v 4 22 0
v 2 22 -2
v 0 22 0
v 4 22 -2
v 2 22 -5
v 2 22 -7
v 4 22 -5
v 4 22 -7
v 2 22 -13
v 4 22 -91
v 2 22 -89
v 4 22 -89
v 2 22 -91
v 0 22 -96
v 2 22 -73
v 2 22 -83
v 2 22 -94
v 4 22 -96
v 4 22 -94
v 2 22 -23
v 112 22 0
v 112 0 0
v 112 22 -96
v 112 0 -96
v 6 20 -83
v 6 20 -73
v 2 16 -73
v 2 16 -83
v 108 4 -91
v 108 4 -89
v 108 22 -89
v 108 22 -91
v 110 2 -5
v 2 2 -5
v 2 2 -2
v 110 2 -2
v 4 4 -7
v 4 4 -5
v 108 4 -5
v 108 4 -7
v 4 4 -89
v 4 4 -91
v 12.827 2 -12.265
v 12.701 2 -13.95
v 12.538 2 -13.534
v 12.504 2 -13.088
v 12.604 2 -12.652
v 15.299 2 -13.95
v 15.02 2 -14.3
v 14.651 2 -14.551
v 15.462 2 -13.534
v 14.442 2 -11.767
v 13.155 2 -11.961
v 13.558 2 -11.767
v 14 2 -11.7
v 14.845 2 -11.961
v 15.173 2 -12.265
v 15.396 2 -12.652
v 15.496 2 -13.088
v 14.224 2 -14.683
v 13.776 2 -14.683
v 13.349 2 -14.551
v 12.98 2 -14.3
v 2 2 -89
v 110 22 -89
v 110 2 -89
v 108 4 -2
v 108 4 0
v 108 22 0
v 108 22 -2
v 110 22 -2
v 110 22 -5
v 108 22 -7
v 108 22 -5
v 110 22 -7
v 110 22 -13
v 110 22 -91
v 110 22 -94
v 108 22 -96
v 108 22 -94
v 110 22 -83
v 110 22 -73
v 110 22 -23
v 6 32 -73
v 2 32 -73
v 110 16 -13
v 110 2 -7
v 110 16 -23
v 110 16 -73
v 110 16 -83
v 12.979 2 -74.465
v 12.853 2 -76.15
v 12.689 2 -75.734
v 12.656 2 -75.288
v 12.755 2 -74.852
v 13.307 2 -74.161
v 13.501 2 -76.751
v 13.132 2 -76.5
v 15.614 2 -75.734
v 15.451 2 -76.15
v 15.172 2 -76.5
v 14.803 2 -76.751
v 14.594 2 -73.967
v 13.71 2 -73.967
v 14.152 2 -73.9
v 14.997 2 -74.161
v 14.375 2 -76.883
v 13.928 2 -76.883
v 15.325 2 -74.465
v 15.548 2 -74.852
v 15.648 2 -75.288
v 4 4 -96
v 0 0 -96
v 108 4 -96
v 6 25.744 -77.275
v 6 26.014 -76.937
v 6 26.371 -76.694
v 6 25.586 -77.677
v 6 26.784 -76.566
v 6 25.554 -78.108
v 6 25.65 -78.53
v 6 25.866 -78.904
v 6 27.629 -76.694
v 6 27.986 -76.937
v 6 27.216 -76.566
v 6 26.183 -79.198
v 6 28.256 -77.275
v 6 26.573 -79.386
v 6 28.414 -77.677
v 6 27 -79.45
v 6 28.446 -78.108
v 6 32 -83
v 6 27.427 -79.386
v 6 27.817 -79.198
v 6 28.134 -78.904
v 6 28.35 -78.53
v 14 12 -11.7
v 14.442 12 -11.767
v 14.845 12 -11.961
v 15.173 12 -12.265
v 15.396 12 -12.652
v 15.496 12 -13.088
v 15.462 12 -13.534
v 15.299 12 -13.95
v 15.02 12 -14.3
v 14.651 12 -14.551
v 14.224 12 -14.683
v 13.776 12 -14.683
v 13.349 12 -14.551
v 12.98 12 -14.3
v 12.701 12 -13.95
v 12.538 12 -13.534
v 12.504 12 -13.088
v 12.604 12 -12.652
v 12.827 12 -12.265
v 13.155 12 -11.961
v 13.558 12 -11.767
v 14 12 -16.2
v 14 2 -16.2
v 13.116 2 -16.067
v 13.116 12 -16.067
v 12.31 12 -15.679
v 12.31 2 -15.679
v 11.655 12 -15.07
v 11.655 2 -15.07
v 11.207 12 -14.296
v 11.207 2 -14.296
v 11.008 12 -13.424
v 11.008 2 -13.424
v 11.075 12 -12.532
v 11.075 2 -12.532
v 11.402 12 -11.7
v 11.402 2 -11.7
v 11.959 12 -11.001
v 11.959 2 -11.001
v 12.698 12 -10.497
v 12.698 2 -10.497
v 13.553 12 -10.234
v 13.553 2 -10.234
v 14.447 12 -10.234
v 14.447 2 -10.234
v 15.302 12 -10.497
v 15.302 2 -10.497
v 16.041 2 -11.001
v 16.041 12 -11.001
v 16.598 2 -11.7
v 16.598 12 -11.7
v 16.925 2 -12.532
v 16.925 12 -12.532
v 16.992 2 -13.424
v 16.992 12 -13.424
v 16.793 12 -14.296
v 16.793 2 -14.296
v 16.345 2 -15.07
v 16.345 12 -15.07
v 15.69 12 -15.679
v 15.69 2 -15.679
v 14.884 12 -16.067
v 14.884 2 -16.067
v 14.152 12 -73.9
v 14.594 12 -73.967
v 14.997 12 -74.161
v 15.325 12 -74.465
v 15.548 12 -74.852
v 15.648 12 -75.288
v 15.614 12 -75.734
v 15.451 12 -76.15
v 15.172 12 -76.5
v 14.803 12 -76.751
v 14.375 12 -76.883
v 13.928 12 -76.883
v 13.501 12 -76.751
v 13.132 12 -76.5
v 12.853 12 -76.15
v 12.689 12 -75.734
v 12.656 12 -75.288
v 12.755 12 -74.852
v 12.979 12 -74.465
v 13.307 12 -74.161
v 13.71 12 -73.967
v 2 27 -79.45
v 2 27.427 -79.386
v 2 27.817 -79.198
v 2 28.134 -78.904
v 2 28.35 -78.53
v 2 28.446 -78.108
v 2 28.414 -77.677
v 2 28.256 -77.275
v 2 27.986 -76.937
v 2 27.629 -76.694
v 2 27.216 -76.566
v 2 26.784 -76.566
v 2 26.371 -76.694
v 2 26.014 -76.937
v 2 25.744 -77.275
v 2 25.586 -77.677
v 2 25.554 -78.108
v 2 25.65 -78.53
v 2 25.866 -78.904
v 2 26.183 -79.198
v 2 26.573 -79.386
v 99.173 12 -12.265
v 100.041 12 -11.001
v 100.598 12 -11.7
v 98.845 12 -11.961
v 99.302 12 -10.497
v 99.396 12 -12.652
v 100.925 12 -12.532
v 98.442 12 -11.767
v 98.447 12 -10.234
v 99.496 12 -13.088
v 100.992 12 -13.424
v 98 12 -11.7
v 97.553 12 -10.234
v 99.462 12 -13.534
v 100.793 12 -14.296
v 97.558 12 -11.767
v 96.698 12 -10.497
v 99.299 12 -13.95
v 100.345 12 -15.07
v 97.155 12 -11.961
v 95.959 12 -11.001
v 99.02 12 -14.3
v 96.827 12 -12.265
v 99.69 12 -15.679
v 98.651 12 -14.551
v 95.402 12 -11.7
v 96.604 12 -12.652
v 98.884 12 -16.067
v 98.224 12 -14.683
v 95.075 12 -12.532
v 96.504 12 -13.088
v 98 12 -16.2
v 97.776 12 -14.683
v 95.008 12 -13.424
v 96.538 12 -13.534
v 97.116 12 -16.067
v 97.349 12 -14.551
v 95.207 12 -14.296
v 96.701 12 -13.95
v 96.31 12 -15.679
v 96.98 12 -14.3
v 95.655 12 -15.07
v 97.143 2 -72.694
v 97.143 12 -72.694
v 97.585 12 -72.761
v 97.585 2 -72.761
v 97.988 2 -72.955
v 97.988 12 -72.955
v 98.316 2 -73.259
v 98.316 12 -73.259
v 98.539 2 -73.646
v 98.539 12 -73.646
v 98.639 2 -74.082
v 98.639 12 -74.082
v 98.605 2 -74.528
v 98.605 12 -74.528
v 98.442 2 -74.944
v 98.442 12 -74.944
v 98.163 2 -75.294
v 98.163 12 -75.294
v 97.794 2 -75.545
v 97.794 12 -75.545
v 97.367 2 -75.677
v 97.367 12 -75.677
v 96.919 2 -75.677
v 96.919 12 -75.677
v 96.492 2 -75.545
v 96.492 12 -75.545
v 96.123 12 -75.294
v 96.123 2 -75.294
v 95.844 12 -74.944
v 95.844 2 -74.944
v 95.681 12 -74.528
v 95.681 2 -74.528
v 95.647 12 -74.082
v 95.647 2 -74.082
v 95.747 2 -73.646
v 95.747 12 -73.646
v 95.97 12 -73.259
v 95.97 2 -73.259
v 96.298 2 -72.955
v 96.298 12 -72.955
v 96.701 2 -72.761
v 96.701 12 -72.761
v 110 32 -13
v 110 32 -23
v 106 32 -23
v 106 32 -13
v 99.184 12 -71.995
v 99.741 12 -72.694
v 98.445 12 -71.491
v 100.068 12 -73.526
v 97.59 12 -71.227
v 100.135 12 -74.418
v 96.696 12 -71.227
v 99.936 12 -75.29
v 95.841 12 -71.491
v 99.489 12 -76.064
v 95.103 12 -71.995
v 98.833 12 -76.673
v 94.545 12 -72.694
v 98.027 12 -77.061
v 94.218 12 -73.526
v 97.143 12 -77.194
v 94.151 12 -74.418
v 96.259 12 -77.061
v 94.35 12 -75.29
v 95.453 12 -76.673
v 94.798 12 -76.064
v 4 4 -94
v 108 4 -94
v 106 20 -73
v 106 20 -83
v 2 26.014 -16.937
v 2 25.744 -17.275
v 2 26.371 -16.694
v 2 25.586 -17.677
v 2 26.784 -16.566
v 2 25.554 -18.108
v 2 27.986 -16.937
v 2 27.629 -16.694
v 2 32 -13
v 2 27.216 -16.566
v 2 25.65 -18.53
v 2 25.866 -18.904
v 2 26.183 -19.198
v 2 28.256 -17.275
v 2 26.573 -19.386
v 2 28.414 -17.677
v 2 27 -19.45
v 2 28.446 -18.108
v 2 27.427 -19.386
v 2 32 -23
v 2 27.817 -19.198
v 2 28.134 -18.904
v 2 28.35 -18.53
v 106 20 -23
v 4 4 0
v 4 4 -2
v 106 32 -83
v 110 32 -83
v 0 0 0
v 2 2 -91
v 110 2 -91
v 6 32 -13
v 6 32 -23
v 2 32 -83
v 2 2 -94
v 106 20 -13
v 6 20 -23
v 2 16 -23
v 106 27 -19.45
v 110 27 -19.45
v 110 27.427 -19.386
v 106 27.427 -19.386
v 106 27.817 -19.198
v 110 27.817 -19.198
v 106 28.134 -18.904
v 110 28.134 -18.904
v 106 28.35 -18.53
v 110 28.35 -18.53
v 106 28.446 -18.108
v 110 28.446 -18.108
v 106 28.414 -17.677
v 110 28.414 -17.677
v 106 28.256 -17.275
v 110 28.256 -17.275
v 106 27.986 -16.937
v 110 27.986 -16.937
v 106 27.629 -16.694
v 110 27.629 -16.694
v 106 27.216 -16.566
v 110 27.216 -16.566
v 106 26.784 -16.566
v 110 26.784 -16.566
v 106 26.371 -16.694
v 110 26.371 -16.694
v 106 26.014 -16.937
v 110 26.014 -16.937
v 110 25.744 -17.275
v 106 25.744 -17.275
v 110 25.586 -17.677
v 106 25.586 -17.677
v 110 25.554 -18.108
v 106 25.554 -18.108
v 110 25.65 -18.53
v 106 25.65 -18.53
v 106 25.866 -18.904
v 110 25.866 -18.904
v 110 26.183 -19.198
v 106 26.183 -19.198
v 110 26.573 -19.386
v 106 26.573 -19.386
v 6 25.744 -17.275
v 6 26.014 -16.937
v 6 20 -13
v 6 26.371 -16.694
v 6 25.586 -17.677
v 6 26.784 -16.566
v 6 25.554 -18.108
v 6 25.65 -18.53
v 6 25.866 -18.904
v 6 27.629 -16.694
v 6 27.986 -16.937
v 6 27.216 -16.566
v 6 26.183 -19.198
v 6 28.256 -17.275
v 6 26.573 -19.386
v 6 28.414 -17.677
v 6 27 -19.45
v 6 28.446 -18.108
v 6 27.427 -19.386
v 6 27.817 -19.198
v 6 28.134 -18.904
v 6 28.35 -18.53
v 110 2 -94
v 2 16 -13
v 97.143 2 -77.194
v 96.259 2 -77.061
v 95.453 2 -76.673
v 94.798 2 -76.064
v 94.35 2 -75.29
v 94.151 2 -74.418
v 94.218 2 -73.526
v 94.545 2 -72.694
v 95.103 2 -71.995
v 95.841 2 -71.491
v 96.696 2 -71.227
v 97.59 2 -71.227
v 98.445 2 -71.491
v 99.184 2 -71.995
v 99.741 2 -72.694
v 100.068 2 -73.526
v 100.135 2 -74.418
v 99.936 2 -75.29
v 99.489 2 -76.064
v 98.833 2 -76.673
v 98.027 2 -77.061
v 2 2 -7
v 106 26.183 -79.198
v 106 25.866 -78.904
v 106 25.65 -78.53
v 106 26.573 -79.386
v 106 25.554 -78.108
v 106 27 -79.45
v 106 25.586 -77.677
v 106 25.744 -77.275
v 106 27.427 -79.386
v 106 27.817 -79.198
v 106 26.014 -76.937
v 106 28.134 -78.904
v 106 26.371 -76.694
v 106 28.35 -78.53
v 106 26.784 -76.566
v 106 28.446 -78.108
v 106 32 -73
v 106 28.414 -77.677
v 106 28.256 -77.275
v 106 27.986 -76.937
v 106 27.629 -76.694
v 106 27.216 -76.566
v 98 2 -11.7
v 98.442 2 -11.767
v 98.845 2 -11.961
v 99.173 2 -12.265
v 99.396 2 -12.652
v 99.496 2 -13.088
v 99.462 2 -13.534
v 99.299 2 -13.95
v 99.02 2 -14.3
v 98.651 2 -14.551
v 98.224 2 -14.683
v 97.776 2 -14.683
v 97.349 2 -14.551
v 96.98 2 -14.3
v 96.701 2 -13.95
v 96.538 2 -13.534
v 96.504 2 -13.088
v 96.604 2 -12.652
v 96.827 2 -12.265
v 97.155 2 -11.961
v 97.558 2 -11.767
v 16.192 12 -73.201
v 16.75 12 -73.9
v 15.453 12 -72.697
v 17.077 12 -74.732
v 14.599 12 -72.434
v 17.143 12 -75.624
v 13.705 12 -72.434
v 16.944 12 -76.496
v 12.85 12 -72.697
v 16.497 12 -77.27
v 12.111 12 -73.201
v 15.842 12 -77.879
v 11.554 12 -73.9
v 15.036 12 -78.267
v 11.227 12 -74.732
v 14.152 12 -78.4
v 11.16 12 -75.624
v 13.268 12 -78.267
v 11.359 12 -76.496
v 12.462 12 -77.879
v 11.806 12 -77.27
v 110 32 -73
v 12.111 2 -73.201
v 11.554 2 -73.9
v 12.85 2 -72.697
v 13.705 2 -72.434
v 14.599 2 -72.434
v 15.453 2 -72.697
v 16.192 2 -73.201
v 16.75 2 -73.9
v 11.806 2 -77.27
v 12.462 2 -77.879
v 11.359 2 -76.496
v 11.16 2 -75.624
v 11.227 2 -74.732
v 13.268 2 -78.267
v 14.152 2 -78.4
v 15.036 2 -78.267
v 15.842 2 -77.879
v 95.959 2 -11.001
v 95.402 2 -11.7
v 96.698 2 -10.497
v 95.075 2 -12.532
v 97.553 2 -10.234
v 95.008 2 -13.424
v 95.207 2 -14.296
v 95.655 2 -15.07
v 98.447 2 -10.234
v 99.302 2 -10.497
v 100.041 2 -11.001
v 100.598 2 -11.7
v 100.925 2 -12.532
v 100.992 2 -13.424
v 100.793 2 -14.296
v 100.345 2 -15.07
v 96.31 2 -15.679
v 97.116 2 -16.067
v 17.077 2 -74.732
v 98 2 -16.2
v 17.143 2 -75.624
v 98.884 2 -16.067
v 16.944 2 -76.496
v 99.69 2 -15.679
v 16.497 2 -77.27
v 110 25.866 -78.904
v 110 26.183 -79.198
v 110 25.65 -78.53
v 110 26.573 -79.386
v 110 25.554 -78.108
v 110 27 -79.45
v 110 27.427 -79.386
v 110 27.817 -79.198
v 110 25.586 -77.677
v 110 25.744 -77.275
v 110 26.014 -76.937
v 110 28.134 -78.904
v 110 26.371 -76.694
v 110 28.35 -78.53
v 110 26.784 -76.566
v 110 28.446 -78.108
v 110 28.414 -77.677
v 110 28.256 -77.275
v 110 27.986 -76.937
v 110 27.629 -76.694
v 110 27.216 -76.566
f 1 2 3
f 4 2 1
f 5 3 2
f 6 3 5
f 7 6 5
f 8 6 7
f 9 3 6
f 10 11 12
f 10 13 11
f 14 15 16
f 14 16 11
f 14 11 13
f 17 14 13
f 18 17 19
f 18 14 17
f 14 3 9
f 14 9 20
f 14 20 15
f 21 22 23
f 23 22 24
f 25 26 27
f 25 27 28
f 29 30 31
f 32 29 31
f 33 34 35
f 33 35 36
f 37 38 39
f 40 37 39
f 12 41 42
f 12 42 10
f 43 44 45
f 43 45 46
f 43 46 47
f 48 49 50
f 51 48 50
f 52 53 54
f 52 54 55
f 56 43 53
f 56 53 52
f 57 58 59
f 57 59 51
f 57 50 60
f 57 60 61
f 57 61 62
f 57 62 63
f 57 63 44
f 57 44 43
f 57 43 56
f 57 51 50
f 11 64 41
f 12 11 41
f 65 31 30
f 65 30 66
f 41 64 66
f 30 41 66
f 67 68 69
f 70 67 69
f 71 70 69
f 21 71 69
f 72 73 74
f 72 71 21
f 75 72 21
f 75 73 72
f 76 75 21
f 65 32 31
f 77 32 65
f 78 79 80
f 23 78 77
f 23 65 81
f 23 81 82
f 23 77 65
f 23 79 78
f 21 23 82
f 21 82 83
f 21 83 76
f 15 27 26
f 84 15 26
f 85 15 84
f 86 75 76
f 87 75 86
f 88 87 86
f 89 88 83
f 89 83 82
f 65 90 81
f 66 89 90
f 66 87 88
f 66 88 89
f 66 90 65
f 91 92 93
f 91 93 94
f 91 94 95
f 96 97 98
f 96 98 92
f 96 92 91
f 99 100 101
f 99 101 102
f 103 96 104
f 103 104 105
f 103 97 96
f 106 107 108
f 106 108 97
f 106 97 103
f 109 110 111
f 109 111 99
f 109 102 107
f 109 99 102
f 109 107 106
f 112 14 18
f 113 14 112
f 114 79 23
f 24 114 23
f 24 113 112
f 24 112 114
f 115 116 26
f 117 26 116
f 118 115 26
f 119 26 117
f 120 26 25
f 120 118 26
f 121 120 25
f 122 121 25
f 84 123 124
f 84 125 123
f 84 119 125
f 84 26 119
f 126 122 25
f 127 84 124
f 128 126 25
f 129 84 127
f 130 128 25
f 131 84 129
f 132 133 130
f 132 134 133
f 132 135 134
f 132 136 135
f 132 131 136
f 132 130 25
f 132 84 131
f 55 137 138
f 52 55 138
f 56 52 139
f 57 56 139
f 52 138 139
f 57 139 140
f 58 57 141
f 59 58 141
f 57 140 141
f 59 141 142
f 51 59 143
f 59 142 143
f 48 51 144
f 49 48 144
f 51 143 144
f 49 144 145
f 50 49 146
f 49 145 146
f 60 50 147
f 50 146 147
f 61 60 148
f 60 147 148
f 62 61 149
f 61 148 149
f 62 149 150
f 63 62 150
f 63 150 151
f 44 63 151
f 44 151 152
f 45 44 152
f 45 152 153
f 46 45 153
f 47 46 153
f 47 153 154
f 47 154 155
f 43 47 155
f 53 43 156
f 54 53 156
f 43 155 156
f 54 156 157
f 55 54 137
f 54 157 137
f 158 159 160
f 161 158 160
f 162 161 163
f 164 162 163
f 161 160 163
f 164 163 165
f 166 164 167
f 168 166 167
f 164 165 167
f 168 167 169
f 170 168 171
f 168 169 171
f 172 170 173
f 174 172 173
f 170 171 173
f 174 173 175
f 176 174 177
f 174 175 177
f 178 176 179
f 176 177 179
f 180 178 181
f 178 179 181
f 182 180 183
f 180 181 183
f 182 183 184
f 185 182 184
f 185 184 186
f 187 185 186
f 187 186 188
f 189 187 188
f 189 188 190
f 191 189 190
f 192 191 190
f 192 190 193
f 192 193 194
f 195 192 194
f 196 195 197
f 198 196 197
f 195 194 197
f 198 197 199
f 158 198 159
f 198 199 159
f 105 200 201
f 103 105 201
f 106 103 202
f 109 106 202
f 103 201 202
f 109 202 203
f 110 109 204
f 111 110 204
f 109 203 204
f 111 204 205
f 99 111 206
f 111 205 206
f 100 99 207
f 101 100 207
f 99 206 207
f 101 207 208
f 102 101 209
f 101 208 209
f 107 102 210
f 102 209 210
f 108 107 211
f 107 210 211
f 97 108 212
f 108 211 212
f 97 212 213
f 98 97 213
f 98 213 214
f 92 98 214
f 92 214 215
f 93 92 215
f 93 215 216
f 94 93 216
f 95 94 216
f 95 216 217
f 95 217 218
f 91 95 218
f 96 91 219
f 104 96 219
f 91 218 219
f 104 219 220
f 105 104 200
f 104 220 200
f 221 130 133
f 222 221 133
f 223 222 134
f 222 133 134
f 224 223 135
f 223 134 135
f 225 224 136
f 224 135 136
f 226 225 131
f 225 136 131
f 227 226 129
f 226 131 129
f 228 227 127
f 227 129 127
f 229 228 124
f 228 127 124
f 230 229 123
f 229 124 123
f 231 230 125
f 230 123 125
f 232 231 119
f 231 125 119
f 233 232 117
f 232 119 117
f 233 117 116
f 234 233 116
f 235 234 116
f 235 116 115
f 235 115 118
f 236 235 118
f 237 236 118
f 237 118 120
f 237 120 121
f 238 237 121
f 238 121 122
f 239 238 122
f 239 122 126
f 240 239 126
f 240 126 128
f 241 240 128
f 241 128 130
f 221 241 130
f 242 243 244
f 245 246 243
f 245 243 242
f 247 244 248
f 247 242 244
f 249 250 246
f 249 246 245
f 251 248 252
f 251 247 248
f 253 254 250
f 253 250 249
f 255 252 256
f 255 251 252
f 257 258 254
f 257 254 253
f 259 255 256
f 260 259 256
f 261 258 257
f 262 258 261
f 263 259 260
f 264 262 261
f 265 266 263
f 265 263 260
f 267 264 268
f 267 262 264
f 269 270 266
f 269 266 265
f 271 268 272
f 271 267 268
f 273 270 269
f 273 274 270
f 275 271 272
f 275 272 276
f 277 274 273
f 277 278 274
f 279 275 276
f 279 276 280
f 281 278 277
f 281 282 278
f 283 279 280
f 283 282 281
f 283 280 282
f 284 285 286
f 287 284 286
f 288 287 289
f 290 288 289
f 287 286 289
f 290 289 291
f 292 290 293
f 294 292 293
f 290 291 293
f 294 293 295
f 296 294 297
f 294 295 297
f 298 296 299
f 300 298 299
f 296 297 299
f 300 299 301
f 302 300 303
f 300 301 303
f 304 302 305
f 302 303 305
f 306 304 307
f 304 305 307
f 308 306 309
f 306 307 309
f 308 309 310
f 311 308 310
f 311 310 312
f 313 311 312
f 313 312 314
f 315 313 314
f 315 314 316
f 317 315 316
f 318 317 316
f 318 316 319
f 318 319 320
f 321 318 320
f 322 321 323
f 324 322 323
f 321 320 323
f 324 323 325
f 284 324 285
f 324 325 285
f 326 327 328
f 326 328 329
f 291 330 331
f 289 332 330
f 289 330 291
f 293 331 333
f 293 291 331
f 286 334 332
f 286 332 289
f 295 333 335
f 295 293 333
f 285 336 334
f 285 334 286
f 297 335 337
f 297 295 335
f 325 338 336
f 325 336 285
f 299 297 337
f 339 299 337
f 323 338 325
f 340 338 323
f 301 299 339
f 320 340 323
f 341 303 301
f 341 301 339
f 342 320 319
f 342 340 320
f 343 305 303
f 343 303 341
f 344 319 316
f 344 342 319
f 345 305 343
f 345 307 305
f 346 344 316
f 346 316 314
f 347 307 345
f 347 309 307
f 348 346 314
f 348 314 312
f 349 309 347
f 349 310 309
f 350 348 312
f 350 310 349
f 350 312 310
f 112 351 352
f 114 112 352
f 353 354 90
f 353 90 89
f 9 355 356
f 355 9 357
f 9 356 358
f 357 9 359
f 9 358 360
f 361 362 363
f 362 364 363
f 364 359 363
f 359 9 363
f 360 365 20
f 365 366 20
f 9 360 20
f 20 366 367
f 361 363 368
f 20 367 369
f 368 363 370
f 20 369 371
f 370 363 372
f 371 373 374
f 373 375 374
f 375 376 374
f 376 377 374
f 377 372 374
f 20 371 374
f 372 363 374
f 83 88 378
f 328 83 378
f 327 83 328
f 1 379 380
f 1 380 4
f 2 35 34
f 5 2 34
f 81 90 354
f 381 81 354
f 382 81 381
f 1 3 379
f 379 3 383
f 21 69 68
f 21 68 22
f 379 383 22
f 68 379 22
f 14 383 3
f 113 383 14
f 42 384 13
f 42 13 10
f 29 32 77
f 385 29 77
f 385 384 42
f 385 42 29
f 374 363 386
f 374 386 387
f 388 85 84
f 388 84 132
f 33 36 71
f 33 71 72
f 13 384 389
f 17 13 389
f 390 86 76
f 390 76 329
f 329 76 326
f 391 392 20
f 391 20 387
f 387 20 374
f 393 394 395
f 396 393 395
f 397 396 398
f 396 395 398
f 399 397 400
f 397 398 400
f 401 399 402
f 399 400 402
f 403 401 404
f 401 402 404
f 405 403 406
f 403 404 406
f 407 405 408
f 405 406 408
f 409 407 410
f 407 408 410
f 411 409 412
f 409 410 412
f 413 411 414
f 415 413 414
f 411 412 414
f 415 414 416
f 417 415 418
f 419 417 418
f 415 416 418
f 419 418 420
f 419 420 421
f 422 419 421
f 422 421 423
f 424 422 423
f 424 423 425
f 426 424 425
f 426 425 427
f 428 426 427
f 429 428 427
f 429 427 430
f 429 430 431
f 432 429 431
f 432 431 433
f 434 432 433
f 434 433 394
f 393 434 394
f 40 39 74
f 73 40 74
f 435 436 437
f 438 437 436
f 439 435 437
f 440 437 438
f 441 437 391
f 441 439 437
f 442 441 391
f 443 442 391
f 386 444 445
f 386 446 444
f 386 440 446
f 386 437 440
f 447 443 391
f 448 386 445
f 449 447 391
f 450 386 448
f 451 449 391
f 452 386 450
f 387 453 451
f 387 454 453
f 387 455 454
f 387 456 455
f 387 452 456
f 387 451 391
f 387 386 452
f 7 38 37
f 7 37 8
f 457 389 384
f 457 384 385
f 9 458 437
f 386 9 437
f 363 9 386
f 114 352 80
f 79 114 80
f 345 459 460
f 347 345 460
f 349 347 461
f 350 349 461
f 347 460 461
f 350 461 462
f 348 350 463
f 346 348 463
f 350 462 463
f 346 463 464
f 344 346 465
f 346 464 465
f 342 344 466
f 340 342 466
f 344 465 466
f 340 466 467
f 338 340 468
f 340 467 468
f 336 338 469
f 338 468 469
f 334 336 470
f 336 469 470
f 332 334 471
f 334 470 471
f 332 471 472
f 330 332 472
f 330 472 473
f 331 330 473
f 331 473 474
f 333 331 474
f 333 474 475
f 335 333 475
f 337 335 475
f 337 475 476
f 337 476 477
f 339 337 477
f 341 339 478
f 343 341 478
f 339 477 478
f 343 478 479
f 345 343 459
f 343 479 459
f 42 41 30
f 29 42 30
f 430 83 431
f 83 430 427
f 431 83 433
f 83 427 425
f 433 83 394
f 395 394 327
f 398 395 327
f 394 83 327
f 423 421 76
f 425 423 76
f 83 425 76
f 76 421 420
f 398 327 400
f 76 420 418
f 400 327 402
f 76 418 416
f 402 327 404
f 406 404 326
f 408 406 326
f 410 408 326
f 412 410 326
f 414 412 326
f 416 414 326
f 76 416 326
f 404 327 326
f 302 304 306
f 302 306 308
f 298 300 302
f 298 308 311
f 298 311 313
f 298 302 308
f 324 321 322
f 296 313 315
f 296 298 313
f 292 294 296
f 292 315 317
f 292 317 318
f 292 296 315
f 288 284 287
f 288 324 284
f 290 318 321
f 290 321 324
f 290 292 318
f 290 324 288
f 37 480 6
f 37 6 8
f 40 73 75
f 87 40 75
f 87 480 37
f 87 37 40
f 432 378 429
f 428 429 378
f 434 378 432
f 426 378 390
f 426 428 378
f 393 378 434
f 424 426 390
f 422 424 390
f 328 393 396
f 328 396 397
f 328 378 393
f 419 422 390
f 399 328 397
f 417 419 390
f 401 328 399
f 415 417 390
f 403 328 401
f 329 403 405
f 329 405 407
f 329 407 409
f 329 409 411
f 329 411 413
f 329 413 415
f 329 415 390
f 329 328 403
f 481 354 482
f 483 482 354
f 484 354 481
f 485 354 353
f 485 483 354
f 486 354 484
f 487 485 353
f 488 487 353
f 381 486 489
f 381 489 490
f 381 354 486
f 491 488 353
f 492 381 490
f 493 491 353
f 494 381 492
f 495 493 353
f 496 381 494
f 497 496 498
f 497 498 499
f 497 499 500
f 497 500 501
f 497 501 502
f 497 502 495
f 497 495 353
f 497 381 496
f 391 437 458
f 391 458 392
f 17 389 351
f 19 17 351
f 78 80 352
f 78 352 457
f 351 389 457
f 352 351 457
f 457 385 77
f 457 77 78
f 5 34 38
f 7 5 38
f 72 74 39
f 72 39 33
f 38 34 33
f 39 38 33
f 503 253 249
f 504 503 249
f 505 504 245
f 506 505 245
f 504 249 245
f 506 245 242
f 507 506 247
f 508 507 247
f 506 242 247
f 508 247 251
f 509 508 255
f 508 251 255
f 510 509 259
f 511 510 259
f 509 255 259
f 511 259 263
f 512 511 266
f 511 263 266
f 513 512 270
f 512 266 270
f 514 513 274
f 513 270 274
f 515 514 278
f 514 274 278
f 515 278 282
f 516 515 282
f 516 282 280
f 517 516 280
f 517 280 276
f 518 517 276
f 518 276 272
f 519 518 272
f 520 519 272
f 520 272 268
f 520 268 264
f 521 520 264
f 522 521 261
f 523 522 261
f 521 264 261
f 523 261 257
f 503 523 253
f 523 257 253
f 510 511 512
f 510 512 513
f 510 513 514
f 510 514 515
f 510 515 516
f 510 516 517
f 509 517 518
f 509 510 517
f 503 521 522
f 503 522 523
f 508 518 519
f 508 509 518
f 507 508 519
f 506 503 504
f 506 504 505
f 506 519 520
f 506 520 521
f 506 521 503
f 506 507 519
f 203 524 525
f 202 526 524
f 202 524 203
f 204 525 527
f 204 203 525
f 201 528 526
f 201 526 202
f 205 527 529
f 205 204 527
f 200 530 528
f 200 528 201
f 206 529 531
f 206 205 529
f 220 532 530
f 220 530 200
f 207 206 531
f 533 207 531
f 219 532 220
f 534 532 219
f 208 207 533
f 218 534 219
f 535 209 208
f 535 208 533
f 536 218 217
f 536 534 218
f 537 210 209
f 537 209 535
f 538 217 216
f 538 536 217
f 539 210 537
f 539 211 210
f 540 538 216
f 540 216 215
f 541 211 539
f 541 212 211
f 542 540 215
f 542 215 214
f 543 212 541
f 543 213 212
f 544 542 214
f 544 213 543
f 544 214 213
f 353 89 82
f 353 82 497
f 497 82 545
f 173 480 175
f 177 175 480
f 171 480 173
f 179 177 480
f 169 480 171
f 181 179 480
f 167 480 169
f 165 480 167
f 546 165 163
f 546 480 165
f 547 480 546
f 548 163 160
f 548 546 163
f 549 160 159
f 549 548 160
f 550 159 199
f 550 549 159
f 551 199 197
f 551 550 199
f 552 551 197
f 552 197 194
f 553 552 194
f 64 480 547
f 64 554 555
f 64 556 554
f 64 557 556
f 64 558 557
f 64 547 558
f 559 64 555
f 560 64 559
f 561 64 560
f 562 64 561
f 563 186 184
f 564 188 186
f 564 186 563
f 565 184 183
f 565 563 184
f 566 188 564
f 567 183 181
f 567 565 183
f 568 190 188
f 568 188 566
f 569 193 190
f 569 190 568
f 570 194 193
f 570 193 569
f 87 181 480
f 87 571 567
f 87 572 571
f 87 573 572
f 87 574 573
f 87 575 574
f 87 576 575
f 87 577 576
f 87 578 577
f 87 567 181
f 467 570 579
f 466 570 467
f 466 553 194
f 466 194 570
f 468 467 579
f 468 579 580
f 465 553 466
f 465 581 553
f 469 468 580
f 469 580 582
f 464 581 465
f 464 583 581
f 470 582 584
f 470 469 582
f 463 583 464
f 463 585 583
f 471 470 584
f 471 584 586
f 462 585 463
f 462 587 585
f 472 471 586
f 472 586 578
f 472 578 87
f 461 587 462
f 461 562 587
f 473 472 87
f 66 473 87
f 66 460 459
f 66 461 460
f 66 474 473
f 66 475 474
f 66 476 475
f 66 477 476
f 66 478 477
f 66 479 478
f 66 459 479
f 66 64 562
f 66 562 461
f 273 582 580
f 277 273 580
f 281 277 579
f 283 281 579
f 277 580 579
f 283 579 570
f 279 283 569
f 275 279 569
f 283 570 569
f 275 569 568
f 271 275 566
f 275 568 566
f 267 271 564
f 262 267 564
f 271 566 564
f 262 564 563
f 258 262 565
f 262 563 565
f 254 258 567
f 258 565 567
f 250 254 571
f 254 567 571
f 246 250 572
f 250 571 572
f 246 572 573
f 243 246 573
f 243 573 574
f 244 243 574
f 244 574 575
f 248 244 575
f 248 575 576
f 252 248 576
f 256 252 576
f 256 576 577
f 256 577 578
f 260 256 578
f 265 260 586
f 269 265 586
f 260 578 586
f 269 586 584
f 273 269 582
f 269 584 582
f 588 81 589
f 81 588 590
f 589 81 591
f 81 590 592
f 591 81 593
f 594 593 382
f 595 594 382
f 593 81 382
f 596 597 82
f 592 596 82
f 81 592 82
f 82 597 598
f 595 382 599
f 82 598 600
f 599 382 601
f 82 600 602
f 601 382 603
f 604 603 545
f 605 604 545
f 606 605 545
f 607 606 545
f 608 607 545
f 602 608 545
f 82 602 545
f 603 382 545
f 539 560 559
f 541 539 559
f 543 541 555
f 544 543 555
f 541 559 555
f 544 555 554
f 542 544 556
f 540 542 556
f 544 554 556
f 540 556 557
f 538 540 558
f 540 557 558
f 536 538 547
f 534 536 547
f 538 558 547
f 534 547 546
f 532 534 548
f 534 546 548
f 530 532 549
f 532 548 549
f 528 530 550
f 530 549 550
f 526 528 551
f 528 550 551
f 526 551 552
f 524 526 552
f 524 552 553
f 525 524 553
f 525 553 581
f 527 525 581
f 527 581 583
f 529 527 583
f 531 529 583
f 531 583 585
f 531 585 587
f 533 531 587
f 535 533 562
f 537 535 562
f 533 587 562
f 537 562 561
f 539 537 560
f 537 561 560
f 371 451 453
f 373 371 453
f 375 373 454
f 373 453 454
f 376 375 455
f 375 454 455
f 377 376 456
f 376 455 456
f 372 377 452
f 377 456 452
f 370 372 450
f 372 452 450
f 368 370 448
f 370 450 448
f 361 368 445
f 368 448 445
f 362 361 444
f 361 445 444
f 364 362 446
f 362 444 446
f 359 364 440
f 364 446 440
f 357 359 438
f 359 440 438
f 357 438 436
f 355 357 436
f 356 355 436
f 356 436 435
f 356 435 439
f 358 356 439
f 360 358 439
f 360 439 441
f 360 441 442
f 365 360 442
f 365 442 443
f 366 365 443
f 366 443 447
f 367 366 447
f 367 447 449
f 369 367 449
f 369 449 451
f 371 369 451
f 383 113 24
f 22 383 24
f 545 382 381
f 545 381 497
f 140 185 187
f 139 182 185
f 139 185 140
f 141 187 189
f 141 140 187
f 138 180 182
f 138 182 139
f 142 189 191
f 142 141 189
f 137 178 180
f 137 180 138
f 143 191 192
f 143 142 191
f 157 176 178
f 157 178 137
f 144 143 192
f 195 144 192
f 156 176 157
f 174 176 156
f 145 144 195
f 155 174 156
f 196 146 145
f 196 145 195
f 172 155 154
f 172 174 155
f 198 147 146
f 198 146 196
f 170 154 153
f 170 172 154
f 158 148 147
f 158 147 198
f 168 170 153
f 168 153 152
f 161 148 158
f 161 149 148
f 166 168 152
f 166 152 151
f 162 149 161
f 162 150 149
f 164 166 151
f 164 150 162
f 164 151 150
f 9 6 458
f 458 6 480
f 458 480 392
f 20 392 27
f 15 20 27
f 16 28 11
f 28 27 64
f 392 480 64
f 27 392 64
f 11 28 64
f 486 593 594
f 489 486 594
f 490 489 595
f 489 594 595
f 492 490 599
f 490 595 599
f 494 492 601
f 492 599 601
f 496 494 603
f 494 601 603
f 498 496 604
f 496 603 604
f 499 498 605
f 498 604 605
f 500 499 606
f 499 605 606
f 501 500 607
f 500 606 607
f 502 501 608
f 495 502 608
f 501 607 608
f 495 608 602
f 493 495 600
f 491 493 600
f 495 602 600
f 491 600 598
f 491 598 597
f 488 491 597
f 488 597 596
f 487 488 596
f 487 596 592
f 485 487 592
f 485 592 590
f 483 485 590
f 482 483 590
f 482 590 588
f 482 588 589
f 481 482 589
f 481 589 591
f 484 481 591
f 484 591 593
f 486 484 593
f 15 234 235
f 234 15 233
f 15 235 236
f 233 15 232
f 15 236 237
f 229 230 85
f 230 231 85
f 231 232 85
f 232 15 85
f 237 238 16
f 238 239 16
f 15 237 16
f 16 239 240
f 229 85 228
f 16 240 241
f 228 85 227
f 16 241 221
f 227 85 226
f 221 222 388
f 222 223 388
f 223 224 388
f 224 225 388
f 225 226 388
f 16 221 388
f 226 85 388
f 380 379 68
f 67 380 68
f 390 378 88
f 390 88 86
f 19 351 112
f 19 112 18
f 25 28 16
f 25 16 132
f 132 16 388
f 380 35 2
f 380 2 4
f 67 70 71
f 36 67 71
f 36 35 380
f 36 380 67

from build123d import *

# Parameters (mm, degrees)
ESBO_O1_W                = 112
ESBO_O1_H                = 96
RESSALTO_EXTRUS_O1_DEPTH = 2
ESBO_O2_W                = 2
ESBO_O2_H                = 96
RESSALTO_EXTRUS_O2_DEPTH = 20
ESBO_O3_W                = 108
ESBO_O3_H                = 2
RESSALTO_EXTRUS_O3_DEPTH = 20
ESBO_O5_W                = 104
ESBO_O5_H                = 18
CORTE_EXTRUS_O1_DEPTH    = 150.1442255
ESBO_O6_R                = 3
RESSALTO_EXTRUS_O4_DEPTH = 10
ESBO_O7_R                = 1.5
CORTE_EXTRUS_O2_DEPTH    = 10
ESBO_O8_W                = 10
ESBO_O8_H                = 16
RESSALTO_EXTRUS_O5_DEPTH = 4
ESBO_O9_W                = 10
ESBO_O9_H                = 16
RESSALTO_EXTRUS_O6_DEPTH = 4
ESBO_O10_R               = 1.45
CORTE_EXTRUS_O3_DEPTH    = 150.465715132
CHANFRO2_SIZE            = 4


with BuildPart() as part:
    # Esboço1 → Ressalto-extrusão1 (new body)
    with BuildSketch(Plane(origin=(0, 0, 0), x_dir=(1, 0, 0), z_dir=(0, 1, 0))):
        with Locations((56, 48)):
            Rectangle(ESBO_O1_W, ESBO_O1_H)
    extrude(amount=RESSALTO_EXTRUS_O1_DEPTH)

    # Esboço2 → Ressalto-extrusão2 (add)
    with BuildSketch(Plane(origin=(0, 2, 0), x_dir=(1, 0, 0), z_dir=(0, 1, 0))):
        with Locations((1, 48)):
            Rectangle(ESBO_O2_W, ESBO_O2_H)
        with Locations((111, 48)):
            Rectangle(ESBO_O2_W, ESBO_O2_H)
    extrude(amount=RESSALTO_EXTRUS_O2_DEPTH)

    # Esboço3 → Ressalto-extrusão3 (add)
    with BuildSketch(Plane(origin=(0, 2, 0), x_dir=(1, 0, 0), z_dir=(0, 1, 0))):
        with Locations((56, 95)):
            Rectangle(ESBO_O3_W, ESBO_O3_H)
        with Locations((56, 1)):
            Rectangle(ESBO_O3_W, ESBO_O3_H)
        with Locations((56, 90)):
            Rectangle(ESBO_O3_W, ESBO_O3_H)
        with Locations((56, 6)):
            Rectangle(ESBO_O3_W, ESBO_O3_H)
    extrude(amount=RESSALTO_EXTRUS_O3_DEPTH)

    # Esboço5 → Corte-extrusão1 (cut, through all)
    with BuildSketch(Plane.XY):
        with Locations((56, 13)):
            Rectangle(ESBO_O5_W, ESBO_O5_H)
    extrude(amount=-CORTE_EXTRUS_O1_DEPTH, mode=Mode.SUBTRACT)

    # Esboço6 → Ressalto-extrusão4 (add)
    with BuildSketch(Plane(origin=(0, 2, 0), x_dir=(1, 0, 0), z_dir=(0, 1, 0))):
        with Locations(Location((98, 13.2, 0), (0, 0, 90))):
            Circle(ESBO_O6_R)
        with Locations(Location((14, 13.2, 0), (0, 0, 90))):
            Circle(ESBO_O6_R)
        with Locations(Location((97.143041423, 74.193980211, 0), (0, 0, 90))):
            Circle(ESBO_O6_R)
        with Locations(Location((14.151803836, 75.4, 0), (0, 0, 90))):
            Circle(ESBO_O6_R)
    extrude(amount=RESSALTO_EXTRUS_O4_DEPTH)

    # Esboço7 → Corte-extrusão2 (cut)
    with BuildSketch(Plane(origin=(0, 12, 0), x_dir=(1, 0, 0), z_dir=(0, 1, 0))):
        with Locations(Location((14.151803836, 75.4, 0), (0, 0, 270))):
            Circle(ESBO_O7_R)
        with Locations(Location((97.143041423, 74.193980211, 0), (0, 0, 270))):
            Circle(ESBO_O7_R)
        with Locations(Location((98, 13.2, 0), (0, 0, 270))):
            Circle(ESBO_O7_R)
        with Locations(Location((14, 13.2, 0), (0, 0, 270))):
            Circle(ESBO_O7_R)
    extrude(amount=-CORTE_EXTRUS_O2_DEPTH, mode=Mode.SUBTRACT)

    # Esboço8 → Ressalto-extrusão5 (add)
    with BuildSketch(Plane.ZY.offset(-110)):
        with Locations((-78, 24)):
            Rectangle(ESBO_O8_W, ESBO_O8_H)
        with Locations((-18, 24)):
            Rectangle(ESBO_O8_W, ESBO_O8_H)
    extrude(amount=RESSALTO_EXTRUS_O5_DEPTH)

    # Esboço9 → Ressalto-extrusão6 (add)
    with BuildSketch(Plane(origin=(2, 0, 0), x_dir=(0, 0, -1), z_dir=(1, 0, 0))):
        with Locations((18, 24)):
            Rectangle(ESBO_O9_W, ESBO_O9_H)
        with Locations((78, 24)):
            Rectangle(ESBO_O9_W, ESBO_O9_H)
    extrude(amount=RESSALTO_EXTRUS_O6_DEPTH)

    # Esboço10 → Corte-extrusão3 (cut, through all)
    with BuildSketch(Plane(origin=(110, 0, 0), x_dir=(0, 0, -1), z_dir=(1, 0, 0))):
        with Locations((18, 27)):
            Circle(ESBO_O10_R)
        with Locations((78, 27)):
            Circle(ESBO_O10_R)
    extrude(amount=-CORTE_EXTRUS_O3_DEPTH, mode=Mode.SUBTRACT)

    # Chanfro2
    chanfro2_edges = [part.edges().sort_by_distance(p)[0] for p in [
        (106, 16, -18),
        (106, 16, -78),
        (6, 16, -78),
        (6, 16, -18),
    ]]
    chamfer(chanfro2_edges, length=CHANFRO2_SIZE - 0.0001)  # a hair under: the kernel refuses the full size


solid = part.part
